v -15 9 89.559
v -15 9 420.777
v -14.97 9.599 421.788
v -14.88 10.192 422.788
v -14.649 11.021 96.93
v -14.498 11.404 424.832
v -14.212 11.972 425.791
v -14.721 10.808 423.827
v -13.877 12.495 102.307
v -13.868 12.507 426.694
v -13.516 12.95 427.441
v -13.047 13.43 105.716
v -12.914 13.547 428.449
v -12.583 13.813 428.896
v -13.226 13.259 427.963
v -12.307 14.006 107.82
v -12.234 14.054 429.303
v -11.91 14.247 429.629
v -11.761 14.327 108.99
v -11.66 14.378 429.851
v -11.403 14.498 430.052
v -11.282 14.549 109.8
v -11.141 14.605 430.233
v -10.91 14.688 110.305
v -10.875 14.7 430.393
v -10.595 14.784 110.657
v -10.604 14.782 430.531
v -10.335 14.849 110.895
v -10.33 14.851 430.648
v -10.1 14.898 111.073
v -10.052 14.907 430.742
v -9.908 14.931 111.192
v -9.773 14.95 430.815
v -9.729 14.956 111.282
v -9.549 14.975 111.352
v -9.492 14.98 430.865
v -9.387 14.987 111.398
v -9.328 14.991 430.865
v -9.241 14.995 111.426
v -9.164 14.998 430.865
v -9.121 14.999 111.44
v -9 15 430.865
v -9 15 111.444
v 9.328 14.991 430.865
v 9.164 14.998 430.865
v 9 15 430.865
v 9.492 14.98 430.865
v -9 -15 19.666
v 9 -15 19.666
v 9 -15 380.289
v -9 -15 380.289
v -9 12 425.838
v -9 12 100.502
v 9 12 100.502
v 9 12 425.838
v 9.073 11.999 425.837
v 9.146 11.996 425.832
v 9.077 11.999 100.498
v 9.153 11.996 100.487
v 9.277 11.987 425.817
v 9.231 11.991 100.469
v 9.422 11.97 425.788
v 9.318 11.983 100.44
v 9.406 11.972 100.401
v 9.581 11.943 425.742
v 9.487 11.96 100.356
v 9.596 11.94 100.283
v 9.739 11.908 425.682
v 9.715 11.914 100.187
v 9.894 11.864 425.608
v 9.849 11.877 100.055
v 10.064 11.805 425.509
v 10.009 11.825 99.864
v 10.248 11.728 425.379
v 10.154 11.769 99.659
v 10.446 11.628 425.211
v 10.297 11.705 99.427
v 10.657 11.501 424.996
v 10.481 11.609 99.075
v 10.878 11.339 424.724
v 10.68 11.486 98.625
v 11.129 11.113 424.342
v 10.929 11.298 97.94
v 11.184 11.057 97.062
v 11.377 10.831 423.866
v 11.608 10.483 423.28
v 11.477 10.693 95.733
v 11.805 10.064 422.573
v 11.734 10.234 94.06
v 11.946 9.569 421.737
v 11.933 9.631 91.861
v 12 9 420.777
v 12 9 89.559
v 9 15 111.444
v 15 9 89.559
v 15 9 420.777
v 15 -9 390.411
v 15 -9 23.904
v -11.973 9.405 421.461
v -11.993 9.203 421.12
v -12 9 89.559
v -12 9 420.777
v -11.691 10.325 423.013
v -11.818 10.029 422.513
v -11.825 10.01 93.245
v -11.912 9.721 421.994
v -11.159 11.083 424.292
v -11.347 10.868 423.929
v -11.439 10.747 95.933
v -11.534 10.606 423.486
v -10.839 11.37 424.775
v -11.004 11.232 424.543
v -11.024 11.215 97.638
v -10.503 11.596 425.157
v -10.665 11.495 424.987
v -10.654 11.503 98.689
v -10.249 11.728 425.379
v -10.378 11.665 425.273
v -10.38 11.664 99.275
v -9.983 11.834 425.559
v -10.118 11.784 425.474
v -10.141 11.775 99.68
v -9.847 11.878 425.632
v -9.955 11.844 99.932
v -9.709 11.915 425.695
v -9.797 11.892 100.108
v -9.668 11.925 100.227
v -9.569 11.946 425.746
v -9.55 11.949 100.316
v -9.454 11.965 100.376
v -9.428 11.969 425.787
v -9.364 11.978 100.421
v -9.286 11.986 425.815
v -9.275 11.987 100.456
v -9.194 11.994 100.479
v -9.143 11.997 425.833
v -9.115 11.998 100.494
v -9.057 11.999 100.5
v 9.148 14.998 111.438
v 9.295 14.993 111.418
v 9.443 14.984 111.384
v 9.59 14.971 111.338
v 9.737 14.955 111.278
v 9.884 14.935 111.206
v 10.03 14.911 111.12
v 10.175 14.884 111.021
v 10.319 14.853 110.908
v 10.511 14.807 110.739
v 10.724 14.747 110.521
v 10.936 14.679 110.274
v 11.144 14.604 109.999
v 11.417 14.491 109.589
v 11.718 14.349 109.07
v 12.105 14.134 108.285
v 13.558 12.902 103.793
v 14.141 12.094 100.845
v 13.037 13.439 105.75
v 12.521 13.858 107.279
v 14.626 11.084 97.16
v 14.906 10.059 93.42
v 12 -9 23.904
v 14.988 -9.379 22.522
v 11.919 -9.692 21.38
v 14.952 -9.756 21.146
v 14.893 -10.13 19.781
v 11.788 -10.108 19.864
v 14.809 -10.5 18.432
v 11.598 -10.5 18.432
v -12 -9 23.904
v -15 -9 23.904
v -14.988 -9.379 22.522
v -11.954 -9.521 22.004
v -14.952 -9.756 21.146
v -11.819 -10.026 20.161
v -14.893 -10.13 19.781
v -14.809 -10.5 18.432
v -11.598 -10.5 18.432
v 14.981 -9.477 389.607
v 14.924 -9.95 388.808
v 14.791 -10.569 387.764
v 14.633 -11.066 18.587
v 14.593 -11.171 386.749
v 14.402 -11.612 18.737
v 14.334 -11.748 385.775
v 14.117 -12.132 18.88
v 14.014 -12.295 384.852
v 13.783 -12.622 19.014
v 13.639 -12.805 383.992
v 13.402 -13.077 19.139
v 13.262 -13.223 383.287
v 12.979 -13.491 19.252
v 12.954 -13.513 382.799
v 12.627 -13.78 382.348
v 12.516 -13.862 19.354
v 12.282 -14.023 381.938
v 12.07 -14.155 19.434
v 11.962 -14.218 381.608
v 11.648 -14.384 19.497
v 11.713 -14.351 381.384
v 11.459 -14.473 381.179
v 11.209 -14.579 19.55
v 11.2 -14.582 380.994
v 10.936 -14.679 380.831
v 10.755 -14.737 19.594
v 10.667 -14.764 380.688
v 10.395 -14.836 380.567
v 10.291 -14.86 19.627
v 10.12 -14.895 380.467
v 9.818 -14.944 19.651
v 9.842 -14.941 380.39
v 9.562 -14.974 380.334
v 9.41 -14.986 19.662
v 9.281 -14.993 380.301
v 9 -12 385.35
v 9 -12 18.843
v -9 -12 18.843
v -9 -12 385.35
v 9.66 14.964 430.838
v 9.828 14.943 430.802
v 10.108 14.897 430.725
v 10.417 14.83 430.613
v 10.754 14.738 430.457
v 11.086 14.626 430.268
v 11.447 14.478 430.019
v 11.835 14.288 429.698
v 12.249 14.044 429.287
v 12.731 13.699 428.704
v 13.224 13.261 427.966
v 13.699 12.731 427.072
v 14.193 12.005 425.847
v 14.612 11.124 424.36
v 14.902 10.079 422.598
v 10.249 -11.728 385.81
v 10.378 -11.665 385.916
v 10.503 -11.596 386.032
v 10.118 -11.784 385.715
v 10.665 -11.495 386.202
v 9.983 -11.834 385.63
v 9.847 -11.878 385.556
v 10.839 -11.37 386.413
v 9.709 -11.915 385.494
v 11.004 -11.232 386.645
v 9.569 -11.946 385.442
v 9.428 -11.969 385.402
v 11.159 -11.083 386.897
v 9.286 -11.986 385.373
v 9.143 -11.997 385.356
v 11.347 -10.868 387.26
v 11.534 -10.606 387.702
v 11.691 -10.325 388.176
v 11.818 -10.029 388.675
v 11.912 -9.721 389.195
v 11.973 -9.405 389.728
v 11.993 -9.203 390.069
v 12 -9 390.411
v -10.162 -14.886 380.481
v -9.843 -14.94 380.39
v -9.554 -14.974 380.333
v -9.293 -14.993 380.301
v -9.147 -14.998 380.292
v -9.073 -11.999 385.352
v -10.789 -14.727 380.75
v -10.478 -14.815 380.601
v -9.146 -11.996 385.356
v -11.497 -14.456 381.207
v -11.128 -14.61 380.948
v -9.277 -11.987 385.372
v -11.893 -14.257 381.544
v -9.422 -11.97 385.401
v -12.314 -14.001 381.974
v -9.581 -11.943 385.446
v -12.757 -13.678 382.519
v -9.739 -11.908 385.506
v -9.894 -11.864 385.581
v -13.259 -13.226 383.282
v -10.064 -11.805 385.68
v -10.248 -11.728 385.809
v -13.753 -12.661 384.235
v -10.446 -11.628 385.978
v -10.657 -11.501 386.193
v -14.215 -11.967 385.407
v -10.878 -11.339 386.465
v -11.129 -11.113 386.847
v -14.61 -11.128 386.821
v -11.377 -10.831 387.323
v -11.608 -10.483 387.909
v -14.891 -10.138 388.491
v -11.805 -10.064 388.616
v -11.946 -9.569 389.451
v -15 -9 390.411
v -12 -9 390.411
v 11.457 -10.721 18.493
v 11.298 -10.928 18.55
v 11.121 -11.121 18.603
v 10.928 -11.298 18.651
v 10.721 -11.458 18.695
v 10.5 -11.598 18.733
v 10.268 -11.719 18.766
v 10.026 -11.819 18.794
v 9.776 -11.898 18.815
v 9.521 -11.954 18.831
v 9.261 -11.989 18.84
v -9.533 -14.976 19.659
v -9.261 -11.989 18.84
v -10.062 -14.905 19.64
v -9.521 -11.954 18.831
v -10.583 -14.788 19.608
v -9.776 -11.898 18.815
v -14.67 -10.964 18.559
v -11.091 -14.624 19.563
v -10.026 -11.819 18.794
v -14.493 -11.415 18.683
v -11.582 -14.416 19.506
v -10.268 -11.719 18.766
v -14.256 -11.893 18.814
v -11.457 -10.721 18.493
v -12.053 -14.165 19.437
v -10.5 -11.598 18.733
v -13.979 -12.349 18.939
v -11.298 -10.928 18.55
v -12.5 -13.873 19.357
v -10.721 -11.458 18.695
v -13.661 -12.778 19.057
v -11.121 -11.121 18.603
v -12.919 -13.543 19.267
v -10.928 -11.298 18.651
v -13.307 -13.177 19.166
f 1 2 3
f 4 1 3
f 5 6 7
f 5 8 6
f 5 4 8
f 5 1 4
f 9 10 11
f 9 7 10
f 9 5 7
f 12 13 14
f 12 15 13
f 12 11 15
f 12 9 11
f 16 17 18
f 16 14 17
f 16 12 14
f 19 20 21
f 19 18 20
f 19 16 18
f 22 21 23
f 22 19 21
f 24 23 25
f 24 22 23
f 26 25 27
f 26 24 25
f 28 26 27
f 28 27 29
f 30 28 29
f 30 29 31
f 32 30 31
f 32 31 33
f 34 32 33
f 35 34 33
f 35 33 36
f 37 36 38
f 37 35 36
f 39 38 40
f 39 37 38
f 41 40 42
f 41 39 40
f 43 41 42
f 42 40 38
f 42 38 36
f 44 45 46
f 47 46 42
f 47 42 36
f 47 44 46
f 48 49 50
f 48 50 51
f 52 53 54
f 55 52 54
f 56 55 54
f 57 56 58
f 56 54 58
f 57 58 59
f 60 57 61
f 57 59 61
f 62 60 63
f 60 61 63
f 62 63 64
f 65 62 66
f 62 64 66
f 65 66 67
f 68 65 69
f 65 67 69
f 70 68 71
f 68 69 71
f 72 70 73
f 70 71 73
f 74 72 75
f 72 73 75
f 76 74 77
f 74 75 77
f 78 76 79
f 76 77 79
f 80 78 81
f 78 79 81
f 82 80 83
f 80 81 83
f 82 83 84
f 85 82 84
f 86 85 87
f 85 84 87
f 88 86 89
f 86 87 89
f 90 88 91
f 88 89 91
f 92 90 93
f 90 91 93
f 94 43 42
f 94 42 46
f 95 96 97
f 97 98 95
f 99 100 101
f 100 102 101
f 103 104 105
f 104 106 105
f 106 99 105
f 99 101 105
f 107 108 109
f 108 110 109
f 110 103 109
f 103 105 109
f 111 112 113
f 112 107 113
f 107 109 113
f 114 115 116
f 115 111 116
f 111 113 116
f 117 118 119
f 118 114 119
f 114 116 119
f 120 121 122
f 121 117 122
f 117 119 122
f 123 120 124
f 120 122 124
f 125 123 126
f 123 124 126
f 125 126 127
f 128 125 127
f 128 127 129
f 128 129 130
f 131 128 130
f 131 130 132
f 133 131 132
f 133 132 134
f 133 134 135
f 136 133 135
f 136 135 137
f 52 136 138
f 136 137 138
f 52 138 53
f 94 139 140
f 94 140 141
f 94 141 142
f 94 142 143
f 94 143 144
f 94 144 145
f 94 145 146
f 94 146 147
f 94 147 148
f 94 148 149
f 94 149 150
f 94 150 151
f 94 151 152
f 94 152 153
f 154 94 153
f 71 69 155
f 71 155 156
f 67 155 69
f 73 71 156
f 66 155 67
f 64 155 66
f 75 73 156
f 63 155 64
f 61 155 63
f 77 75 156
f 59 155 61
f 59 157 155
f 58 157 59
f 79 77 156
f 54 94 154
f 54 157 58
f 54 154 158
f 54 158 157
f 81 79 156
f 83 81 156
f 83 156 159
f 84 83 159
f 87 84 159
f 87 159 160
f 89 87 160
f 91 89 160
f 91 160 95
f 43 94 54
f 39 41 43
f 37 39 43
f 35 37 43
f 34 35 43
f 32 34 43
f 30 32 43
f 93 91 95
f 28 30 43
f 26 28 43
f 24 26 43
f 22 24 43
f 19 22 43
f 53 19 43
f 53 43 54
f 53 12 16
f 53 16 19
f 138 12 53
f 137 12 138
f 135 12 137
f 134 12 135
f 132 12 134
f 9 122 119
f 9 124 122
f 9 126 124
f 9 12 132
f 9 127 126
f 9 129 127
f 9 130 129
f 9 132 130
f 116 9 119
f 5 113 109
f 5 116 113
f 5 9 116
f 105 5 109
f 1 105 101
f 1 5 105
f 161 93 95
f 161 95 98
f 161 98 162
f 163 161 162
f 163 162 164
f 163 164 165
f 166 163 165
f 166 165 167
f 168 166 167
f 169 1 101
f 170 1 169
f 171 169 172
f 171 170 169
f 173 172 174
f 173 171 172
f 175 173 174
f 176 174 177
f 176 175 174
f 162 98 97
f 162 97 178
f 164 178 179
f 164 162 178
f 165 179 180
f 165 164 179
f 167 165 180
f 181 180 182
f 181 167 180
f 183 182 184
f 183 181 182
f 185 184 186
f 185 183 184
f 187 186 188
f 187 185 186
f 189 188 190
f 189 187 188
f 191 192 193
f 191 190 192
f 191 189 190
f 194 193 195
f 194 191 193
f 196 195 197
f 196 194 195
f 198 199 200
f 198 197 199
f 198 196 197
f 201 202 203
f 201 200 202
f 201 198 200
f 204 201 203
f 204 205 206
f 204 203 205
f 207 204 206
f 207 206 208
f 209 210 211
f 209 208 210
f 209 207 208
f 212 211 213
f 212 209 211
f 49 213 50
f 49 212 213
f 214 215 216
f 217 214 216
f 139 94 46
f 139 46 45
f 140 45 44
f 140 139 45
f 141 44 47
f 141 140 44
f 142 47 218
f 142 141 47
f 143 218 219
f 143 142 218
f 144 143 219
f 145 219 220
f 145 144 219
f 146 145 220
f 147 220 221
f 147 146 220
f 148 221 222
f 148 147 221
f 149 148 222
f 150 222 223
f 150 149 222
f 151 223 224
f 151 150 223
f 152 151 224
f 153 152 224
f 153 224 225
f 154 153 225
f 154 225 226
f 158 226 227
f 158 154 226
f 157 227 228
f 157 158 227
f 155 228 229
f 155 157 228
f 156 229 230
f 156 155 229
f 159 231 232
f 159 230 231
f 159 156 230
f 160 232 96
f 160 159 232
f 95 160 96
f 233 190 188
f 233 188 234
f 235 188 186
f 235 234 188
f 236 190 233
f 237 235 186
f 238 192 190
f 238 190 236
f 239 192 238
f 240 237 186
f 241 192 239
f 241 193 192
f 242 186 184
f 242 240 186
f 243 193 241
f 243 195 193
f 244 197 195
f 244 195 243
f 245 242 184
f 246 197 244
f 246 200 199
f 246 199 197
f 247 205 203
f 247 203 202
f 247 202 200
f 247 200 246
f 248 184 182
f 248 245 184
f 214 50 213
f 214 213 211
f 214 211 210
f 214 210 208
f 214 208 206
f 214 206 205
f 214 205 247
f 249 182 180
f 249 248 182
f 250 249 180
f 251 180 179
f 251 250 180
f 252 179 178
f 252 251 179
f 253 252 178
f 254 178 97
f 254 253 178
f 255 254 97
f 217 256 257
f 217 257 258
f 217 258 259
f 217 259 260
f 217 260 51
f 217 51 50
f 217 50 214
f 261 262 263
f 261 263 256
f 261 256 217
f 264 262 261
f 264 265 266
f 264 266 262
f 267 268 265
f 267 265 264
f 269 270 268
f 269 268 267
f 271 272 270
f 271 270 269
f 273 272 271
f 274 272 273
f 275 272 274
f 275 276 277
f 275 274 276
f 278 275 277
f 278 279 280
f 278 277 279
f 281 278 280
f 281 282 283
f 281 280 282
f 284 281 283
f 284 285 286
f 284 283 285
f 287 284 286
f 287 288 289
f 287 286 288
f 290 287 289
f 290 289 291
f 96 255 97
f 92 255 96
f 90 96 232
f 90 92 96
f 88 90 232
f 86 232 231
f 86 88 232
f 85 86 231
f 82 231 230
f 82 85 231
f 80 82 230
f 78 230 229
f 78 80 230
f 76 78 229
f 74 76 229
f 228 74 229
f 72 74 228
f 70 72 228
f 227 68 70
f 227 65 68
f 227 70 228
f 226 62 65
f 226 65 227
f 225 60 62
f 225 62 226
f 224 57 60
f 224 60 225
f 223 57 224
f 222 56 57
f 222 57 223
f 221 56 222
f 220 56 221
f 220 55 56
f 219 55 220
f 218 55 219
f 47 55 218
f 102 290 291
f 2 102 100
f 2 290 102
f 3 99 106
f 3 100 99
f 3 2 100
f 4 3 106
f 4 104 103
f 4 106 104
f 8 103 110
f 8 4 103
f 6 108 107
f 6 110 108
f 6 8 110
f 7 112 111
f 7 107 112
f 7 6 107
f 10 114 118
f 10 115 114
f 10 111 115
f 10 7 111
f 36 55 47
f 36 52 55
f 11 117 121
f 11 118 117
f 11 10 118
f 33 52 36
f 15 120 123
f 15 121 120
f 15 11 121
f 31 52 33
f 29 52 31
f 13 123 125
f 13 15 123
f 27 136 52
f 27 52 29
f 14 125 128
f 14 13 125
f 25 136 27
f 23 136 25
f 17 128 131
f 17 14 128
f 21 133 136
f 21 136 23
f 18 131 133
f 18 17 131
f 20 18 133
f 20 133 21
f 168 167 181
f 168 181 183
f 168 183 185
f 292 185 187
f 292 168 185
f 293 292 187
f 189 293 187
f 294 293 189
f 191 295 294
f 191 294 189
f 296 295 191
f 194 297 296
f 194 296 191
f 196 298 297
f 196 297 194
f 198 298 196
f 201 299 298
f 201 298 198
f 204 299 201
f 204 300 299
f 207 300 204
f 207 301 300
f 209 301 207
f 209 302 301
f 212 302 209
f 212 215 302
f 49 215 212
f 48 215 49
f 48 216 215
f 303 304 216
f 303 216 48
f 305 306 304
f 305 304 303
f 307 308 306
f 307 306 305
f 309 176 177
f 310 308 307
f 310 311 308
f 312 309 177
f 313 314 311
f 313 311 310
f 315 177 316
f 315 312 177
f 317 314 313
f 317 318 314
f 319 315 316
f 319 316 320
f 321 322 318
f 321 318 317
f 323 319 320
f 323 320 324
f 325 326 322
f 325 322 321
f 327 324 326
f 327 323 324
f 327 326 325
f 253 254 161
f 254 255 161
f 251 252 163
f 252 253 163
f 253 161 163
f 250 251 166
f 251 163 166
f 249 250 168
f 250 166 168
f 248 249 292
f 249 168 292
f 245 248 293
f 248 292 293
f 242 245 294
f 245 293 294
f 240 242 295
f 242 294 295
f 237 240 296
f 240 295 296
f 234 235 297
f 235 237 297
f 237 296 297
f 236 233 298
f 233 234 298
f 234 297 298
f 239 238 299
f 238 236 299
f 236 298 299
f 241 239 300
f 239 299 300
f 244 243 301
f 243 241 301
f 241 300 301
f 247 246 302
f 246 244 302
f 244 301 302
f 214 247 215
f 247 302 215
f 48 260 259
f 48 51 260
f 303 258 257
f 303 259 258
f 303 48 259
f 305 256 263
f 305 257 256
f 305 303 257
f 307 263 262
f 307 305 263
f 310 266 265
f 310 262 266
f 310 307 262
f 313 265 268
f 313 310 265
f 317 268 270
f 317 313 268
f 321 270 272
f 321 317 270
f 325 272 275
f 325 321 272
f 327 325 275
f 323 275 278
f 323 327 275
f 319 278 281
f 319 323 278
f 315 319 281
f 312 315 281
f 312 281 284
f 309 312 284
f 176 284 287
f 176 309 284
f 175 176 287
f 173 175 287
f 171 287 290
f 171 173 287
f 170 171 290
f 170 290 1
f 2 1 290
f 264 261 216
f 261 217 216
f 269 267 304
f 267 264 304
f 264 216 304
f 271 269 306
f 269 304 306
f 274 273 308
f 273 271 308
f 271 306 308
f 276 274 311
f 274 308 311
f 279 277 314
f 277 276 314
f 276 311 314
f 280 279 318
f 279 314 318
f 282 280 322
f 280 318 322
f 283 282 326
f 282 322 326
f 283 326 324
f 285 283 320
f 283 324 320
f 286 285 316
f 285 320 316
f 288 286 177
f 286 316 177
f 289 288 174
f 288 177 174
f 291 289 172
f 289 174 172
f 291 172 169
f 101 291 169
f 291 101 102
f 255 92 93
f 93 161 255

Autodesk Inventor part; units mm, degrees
ref_plane "Start Plane" through (0, 0, 18.432) normal (0, 0, 1) x (1, 0, 0)
ref_plane "End Plane" through (0, 0, 430.8653) normal (0, 0, 1) x (1, 0, 0)
sketch "Sketch" plane through (0, 0, 0) normal (0, 0, 1) x (1, 0, 0)
  line L0 (-15, -9) -> (-15, 9)
  line L1 (-9, 15) -> (9, 15)
  line L2 (15, 9) -> (15, -9)
  line L3 (9, -15) -> (-9, -15)
  arc A0 (-15, -9) -> (-9, -15) centre (-9, -9) ccw
  arc A1 (-9, 15) -> (-15, 9) centre (-9, 9) ccw
  arc A2 (15, 9) -> (9, 15) centre (9, 9) ccw
  arc A3 (9, -15) -> (15, -9) centre (9, -9) ccw
  arc A4 (-9, 12) -> (-12, 9) centre (-9, 9) ccw
  line L4 (-9, 12) -> (9, 12)
  arc A5 (12, 9) -> (9, 12) centre (9, 9) ccw
  line L5 (12, 9) -> (12, -9)
  arc A6 (9, -12) -> (12, -9) centre (9, -9) ccw
  line L6 (9, -12) -> (-9, -12)
  arc A7 (-12, -9) -> (-9, -12) centre (-9, -9) ccw
  line L7 (-12, -9) -> (-12, 9)
  line L8 (0, 22.7397) -> (0, -22.7397) construction
  line L9 (-22.7397, 0) -> (22.7397, 0) construction
  dimension "d7" = 6
  dimension "d10" = 30
  dimension "d11" = 30
  dimension "d12" = 3
  dimension "d15" = 15
  dimension "d16" = 15
extrude "Body" add sketch "Sketch" along normal up to surface (412.4333 mm away) from surface at 18.432
sketch "Sketch3" plane through (0, 0, 0) normal (0, 0, 1) x (1, 0, 0)
  line L0 (0, 0) -> (10, 0)
ref_plane "Work Plane3" through (0, 0, 0) normal (0, -1, 0) x (1, 0, 0)
ref_plane "Work Plane4" through (9, -14.4663, 3.9657) normal (0, 0.9644, -0.2644) x (1, 0, 0)
split "Split1" plane through (9, -14.4663, 3.9657) removes the side toward (0, 0.9644, -0.2644)
ref_plane "Work Plane5" through (-9, 3.9657, 14.4663) normal (0, -0.2644, -0.9644) x (1, 0, 0)
split "Split2" plane through (-9, 3.9657, 14.4663) removes the side toward (0, -0.2644, -0.9644)
ref_plane "Work Plane6" through (-9, -208.9131, 53.1585) normal (0, -0.8602, 0.5099) x (1, 0, 0)
split "Split3" plane through (-9, -208.9131, 53.1585) removes the side toward (0, -0.8602, 0.5099)
sketch "Sketch4" plane through (0, 0, 0) normal (0, -1, 0) x (1, 0, 0)
  line L0 (-2, 18.432) -> (12, 18.432) projected
  line L1 (-2, 430.8653) -> (12, 430.8653) projected
  dimension "d18" = 412.4333
equation "\"d7\" = G_IR"
equation "\"d10\" = G_H"
equation "\"d11\" = G_W"
equation "\"d12\" = G_T"
equation "\"d15\" = 0.5 * d10"
equation "\"d16\" = 0.5 * d11"
equation "\"d3\" = G_L"
equation "\"G_W\" = 30"
equation "\"G_H\" = 30"
equation "\"G_T\" = 3"
equation "\"G_IR\" = 6"
equation "\"G_L\" = d18"
equation "\"G_OFFSET_START\" = -18.432"
equation "\"G_OFFSET_END\" = -4.11204"
equation "\"d13\" = -G_OFFSET_START"
equation "\"d14\" = G_OFFSET_END + B_L"
equation "\"B_L\" = 434.9773"
properties part number "DIN EN 10219-2 - 30 x 30 x 3  - 412.43" material "Steel, Mild"
